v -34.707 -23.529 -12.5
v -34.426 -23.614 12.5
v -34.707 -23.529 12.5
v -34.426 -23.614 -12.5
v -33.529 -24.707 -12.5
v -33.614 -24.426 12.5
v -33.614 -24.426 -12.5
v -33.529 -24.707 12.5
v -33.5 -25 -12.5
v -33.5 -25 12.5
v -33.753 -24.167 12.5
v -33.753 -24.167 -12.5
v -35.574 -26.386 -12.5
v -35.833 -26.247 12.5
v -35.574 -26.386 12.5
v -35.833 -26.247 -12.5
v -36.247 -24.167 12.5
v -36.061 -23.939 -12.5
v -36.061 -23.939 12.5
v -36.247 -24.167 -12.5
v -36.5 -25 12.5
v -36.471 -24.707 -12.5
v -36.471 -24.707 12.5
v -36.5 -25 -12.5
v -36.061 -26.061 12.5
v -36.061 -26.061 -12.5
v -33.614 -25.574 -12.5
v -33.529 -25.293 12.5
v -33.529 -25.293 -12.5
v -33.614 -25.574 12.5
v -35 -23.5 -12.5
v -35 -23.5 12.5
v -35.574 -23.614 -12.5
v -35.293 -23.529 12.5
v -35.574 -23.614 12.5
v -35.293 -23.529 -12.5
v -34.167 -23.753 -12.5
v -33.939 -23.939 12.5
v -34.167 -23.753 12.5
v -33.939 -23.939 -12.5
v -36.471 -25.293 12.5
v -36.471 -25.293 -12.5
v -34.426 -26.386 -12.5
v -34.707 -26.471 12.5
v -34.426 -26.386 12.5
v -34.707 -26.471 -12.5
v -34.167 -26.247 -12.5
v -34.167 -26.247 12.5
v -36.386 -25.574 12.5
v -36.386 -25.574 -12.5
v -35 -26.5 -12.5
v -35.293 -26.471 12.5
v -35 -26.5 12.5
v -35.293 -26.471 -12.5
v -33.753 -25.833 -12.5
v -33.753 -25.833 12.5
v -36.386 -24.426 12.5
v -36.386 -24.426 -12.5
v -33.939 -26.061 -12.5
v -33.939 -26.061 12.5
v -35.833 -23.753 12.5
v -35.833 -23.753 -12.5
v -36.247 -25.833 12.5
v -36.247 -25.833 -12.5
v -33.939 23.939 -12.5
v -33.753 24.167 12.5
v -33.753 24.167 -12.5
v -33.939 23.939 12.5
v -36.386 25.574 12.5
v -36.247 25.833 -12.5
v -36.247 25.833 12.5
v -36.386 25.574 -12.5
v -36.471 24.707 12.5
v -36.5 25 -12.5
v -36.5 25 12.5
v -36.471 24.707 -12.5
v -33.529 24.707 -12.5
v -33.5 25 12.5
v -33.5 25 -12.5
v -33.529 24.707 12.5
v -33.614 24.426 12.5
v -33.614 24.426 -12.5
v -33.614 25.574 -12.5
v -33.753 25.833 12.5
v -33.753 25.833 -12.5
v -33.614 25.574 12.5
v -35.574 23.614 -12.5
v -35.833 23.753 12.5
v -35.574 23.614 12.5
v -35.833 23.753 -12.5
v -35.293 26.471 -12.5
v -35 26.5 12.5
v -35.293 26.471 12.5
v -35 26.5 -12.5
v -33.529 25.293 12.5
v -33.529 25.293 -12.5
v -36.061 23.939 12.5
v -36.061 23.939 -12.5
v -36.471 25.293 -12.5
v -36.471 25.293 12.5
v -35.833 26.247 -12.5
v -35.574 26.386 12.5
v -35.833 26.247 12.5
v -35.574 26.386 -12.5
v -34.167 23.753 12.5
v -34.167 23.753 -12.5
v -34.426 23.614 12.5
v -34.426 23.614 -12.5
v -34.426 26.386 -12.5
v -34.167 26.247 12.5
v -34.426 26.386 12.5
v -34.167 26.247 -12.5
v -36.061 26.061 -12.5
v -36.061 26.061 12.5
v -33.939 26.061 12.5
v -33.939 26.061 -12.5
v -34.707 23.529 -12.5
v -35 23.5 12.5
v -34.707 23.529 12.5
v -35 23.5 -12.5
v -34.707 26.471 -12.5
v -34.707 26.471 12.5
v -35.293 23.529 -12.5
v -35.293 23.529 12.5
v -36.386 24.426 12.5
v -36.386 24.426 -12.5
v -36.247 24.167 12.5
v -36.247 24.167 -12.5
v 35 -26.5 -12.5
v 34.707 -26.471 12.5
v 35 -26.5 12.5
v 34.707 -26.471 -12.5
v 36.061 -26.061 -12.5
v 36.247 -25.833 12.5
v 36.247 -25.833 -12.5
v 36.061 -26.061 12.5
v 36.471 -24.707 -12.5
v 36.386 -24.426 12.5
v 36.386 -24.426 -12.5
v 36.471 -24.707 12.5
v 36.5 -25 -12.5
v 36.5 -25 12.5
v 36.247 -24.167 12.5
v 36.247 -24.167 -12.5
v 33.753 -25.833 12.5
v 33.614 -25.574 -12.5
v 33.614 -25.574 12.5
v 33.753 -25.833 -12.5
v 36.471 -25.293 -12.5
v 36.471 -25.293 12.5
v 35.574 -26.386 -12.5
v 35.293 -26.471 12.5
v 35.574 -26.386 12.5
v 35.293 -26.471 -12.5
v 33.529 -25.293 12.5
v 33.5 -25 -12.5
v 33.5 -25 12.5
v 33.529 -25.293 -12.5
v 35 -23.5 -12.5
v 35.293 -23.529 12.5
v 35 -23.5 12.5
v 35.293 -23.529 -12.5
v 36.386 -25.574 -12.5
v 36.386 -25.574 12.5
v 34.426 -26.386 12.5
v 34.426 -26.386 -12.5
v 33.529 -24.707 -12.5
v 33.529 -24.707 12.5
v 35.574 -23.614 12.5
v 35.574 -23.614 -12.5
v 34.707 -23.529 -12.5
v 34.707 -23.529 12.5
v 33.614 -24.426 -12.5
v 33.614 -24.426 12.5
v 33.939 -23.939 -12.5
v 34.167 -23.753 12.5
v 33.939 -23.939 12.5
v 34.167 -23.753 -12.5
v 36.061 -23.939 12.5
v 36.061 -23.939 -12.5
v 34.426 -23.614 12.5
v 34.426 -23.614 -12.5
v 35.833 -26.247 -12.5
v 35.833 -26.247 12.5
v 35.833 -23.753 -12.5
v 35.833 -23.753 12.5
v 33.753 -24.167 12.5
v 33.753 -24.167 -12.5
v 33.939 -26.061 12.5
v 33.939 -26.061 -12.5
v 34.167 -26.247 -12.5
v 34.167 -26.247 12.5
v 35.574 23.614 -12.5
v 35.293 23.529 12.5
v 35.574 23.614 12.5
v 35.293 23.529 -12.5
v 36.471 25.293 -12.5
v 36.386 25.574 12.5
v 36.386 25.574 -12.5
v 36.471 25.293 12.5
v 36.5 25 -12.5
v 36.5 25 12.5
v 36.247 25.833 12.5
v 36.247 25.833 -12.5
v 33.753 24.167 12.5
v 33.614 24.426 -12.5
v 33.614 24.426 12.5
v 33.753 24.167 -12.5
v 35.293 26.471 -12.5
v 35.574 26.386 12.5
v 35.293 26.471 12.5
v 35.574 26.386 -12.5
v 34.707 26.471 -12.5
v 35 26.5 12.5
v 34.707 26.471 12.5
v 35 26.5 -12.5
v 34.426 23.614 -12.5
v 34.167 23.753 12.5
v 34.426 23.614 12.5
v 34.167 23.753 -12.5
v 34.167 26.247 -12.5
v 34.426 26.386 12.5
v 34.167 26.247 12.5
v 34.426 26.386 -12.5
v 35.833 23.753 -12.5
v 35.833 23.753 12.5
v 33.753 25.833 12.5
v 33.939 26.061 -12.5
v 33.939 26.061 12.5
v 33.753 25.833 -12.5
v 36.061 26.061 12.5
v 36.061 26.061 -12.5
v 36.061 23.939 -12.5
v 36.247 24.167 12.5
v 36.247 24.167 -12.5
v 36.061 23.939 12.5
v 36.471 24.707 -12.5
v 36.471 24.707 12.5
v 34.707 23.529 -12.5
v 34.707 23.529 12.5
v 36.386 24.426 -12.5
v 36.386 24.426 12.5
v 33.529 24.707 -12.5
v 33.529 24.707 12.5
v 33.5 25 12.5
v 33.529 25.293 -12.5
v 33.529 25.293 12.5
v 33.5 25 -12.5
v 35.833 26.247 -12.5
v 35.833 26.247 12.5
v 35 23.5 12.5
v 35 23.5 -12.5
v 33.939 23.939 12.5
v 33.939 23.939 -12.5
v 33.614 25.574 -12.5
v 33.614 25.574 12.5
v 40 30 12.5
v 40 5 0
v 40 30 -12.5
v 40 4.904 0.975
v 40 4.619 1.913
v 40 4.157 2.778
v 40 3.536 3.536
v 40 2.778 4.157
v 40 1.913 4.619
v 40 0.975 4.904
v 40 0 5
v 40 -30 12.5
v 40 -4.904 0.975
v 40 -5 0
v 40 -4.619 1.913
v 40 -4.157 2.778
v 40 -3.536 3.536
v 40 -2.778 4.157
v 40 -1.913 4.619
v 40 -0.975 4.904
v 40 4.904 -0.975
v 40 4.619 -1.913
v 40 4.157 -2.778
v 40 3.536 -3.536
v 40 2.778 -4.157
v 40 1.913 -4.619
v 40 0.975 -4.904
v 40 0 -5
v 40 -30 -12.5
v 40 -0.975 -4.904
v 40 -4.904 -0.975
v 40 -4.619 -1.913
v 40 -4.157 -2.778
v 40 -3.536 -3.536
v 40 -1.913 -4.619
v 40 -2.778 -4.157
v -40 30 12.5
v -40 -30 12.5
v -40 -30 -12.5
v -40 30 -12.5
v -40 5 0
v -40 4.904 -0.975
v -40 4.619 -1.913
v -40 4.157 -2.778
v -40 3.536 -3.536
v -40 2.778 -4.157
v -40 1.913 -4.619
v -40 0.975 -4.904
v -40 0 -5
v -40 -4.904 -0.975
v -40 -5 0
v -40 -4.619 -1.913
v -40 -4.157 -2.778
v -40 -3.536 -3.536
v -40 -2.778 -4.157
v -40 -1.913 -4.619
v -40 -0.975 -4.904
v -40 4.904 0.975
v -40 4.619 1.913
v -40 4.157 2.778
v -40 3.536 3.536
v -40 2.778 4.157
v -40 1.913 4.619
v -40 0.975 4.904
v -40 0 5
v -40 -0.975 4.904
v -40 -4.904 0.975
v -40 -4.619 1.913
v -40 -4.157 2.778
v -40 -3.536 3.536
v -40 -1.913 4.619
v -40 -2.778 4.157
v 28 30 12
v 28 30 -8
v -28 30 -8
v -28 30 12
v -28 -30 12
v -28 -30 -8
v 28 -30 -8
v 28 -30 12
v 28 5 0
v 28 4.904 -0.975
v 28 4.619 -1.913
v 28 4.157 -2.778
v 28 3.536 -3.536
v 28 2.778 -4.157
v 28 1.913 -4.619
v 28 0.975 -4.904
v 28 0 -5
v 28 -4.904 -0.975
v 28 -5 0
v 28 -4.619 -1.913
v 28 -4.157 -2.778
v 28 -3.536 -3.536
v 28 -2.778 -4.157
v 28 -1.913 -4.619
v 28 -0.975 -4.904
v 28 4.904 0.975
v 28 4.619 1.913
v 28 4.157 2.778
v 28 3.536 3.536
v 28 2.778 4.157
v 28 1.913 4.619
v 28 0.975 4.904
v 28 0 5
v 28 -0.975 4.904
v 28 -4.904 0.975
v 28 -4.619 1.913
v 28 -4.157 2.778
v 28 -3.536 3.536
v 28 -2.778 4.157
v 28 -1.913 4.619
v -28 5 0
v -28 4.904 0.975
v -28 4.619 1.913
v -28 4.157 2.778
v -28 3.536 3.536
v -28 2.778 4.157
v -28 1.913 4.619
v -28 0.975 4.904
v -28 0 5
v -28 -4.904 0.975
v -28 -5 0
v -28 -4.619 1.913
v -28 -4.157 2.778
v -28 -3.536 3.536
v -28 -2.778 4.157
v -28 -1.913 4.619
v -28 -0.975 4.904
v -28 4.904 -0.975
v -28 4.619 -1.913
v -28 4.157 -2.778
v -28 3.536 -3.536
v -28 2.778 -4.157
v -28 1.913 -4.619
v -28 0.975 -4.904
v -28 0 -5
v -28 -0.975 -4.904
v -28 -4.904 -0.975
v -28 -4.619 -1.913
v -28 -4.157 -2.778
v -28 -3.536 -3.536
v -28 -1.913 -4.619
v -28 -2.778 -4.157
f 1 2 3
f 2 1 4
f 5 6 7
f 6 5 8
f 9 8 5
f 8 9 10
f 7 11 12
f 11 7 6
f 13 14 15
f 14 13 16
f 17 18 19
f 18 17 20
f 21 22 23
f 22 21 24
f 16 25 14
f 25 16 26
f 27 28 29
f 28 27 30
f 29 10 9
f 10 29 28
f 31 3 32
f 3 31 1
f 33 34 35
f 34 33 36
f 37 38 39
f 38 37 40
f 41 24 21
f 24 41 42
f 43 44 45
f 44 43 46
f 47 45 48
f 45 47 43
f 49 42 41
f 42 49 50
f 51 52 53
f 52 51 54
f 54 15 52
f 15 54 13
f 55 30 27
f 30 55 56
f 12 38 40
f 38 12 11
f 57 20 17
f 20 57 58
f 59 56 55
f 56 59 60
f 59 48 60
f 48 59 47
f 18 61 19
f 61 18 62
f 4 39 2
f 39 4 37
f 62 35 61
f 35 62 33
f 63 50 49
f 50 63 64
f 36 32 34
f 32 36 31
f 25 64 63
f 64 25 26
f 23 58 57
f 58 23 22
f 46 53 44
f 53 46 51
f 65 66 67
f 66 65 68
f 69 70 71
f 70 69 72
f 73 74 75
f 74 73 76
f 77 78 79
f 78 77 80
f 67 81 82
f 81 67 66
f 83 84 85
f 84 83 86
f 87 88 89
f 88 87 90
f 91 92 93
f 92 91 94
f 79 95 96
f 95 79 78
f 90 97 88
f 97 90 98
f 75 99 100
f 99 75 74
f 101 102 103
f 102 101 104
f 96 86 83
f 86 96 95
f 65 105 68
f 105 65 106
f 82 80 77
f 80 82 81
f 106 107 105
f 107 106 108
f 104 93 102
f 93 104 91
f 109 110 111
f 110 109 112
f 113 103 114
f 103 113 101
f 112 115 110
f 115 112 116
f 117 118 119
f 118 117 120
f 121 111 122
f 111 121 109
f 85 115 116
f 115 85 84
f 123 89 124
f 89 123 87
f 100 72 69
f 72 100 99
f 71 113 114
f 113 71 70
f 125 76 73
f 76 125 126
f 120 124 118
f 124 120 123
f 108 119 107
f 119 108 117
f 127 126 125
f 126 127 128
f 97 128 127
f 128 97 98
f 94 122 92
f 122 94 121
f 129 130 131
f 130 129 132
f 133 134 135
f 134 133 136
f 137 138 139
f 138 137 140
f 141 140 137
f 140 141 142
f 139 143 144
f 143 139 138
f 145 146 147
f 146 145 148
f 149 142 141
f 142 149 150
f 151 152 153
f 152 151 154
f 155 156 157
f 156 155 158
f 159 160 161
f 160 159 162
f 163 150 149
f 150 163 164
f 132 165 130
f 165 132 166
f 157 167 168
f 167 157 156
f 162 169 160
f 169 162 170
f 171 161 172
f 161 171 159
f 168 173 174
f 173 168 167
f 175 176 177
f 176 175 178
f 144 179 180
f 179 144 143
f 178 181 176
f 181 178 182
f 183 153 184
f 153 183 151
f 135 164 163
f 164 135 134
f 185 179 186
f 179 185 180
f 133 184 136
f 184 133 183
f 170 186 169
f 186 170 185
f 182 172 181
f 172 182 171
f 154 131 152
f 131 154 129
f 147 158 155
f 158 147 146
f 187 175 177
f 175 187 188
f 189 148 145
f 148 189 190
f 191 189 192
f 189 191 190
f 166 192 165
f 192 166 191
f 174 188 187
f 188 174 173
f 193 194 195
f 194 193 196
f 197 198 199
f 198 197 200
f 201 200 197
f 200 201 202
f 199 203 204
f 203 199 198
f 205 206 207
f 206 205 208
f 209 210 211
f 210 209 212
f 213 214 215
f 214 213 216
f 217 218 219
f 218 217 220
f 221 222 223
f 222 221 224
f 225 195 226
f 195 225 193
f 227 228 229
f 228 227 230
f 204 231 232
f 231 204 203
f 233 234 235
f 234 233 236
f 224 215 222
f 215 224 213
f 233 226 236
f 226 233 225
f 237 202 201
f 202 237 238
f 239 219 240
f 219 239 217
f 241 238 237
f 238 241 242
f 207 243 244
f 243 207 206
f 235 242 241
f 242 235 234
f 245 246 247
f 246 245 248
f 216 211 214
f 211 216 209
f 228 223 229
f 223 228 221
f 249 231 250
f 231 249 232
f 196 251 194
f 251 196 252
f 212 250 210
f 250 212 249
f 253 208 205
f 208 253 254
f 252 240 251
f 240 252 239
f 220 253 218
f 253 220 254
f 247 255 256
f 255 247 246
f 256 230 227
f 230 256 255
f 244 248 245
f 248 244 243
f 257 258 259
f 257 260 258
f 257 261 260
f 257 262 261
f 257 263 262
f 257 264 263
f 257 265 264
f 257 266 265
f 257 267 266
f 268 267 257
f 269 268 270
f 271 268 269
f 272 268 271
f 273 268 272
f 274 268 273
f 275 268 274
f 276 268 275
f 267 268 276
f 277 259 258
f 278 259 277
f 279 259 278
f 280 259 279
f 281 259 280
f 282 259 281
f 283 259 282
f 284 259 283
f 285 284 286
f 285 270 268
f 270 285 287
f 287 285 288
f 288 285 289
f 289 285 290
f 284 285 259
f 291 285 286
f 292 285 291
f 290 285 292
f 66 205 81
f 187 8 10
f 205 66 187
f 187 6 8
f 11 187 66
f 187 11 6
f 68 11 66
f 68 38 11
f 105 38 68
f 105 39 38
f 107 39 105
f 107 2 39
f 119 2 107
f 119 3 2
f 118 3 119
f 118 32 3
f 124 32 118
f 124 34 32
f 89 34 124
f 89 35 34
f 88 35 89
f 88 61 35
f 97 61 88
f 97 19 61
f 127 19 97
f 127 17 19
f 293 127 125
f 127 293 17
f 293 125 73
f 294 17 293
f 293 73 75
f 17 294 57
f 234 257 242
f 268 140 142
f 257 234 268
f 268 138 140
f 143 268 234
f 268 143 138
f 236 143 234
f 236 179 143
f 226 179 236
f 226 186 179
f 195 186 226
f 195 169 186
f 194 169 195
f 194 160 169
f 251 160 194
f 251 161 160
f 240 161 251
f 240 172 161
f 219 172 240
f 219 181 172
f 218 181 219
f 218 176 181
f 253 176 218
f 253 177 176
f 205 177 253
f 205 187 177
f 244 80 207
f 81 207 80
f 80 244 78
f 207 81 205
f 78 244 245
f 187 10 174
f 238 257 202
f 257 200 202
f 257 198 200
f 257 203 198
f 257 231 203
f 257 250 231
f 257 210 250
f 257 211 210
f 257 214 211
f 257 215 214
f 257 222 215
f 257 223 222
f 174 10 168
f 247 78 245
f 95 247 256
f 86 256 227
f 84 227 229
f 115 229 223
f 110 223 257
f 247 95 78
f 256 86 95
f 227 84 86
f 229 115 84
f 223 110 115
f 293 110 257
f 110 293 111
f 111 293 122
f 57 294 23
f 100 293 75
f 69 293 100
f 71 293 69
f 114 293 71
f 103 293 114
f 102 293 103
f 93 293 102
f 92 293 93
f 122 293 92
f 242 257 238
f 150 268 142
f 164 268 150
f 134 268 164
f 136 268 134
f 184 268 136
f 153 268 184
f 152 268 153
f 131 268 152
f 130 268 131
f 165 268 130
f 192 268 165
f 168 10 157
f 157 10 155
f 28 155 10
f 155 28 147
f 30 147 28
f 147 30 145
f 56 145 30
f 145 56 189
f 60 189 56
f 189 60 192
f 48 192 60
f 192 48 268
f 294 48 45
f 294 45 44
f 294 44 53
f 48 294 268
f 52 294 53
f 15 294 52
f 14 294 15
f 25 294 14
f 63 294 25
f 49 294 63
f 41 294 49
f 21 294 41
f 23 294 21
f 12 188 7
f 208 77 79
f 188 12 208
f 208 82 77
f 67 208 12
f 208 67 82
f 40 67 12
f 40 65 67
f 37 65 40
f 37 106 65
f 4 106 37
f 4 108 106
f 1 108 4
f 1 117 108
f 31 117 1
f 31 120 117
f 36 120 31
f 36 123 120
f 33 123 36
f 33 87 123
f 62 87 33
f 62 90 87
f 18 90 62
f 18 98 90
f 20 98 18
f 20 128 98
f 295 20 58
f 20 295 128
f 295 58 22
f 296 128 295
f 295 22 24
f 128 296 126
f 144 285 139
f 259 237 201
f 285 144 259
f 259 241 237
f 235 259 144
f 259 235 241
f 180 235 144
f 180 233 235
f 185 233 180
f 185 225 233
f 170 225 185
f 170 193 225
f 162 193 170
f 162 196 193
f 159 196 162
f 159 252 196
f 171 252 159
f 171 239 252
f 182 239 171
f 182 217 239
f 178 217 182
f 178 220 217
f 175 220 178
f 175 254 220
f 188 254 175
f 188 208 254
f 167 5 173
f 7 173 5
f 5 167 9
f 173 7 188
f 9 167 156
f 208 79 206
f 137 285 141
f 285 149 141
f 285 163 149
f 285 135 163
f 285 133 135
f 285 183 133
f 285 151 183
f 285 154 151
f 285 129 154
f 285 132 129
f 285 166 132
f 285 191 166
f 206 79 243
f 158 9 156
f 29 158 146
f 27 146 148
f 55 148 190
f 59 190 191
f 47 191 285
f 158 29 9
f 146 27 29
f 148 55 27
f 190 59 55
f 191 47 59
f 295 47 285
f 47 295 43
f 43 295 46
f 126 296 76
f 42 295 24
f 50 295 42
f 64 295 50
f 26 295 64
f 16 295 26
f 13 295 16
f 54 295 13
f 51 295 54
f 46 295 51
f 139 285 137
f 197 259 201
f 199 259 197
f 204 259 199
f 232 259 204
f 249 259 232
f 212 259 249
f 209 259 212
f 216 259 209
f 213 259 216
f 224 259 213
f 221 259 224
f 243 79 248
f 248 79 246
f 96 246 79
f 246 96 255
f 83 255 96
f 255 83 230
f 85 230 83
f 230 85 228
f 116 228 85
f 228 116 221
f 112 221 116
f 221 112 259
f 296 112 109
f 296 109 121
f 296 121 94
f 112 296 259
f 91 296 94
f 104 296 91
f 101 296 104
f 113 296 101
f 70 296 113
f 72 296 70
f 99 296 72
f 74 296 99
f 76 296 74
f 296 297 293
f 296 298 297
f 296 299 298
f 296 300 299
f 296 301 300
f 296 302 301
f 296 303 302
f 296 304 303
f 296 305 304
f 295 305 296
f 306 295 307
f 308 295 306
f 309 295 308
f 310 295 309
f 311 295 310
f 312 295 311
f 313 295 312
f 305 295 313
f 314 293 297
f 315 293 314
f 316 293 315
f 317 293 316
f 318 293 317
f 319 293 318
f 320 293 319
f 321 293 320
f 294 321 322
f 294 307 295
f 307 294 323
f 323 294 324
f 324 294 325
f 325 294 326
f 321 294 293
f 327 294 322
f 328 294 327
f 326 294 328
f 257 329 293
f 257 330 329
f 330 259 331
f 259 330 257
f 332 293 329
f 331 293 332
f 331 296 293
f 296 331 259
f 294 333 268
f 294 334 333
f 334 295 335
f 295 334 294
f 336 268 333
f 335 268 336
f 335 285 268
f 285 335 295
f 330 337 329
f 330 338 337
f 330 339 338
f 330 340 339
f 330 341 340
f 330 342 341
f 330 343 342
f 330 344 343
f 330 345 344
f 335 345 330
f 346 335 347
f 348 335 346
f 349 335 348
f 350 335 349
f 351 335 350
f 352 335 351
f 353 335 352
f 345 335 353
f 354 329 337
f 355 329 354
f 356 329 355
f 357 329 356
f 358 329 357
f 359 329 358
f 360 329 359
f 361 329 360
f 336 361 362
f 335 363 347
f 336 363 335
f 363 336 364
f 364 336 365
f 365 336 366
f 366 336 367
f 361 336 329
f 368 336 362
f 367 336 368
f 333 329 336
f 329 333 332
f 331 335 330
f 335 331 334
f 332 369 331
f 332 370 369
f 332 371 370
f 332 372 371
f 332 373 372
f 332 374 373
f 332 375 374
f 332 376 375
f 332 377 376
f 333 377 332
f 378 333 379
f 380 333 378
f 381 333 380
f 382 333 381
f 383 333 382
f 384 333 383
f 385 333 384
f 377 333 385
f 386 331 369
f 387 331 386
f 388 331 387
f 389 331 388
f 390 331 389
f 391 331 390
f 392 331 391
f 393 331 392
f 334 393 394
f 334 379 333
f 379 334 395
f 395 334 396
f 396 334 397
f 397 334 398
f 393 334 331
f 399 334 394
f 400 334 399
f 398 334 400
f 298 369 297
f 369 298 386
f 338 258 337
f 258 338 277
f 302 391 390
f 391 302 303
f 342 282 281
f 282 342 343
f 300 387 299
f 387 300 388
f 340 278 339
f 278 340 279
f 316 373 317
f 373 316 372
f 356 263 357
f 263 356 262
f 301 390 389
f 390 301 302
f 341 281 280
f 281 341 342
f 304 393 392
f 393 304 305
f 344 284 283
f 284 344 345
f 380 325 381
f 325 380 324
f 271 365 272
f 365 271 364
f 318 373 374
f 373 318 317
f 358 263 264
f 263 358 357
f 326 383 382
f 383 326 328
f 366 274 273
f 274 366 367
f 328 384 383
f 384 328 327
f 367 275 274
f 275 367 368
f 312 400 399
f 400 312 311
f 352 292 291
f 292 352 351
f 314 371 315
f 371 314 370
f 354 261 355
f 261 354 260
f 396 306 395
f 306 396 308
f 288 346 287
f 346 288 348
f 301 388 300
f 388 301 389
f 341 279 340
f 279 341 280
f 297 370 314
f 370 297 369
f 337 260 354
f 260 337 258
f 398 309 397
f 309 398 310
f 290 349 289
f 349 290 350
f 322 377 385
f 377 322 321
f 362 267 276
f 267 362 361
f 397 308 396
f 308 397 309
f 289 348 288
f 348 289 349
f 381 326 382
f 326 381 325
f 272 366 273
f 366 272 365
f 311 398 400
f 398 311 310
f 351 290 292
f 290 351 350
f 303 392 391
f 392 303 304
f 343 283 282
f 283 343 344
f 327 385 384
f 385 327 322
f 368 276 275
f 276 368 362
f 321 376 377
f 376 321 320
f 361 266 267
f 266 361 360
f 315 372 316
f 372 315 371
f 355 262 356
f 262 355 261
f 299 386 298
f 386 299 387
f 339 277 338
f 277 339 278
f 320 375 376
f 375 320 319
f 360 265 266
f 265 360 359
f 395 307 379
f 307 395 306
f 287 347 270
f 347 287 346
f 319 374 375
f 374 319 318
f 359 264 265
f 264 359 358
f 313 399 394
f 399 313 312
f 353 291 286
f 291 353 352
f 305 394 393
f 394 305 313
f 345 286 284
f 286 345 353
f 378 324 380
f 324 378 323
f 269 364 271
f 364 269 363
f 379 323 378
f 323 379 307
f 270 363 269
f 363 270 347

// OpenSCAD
// COBRA Brain Housing (Sacrum)

$fn = 32;

difference() {
    cube([80, 60, 25], center=true);
    
    // RPi5 cavity
    translate([0, -5, 2])
    cube([56, 85, 20], center=true);
    
    // Wiring channel
    rotate([0, 90, 0])
    cylinder(h=82, d=10, center=true);
    
    // Mounting holes
    for(x = [-35, 35]) {
        for(y = [-25, 25]) {
            translate([x, y, 0])
            cylinder(h=27, d=3, center=true);
        }
    }
}
